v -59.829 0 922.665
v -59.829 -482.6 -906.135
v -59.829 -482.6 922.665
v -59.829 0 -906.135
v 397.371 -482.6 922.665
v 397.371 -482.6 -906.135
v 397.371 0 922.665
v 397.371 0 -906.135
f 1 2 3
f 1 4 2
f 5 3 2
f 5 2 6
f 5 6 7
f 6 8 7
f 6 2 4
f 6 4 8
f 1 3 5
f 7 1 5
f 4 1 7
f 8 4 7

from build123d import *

# Parameters (mm, degrees)
F0_W      = 457.2
F0_H      = 1828.8
F1_DEPTH  = 457.2
F2_W      = 168.482557
F2_H      = 257.74318
F3_DEPTH  = 355.6
F1_FACE_W = 457.2
F1_FACE_H = 1828.8
F4_DEPTH  = 25.4


with BuildPart() as f1:
    # F0 (on Front) → F1 (new body)
    with BuildSketch(Plane.XZ):
        with Locations((168.771205, 8.264739)):
            Rectangle(F0_W, F0_H)
    extrude(amount=F1_DEPTH)

    # F2 (on face) → F3 (join)
    with BuildSketch(Plane.XZ.offset(457.2)):
        with Locations((252.723835, 746.079415)):
            Rectangle(F2_W, F2_H)
    extrude(amount=-F3_DEPTH)

    # F1_face (on face) → F4 (join)
    with BuildSketch(Plane(origin=(168.771205, -457.2, 8.264739), x_dir=(1, 0, 0), z_dir=(0, -1, 0))):
        Rectangle(F1_FACE_W, F1_FACE_H)
    extrude(amount=F4_DEPTH)


solid = f1.part
